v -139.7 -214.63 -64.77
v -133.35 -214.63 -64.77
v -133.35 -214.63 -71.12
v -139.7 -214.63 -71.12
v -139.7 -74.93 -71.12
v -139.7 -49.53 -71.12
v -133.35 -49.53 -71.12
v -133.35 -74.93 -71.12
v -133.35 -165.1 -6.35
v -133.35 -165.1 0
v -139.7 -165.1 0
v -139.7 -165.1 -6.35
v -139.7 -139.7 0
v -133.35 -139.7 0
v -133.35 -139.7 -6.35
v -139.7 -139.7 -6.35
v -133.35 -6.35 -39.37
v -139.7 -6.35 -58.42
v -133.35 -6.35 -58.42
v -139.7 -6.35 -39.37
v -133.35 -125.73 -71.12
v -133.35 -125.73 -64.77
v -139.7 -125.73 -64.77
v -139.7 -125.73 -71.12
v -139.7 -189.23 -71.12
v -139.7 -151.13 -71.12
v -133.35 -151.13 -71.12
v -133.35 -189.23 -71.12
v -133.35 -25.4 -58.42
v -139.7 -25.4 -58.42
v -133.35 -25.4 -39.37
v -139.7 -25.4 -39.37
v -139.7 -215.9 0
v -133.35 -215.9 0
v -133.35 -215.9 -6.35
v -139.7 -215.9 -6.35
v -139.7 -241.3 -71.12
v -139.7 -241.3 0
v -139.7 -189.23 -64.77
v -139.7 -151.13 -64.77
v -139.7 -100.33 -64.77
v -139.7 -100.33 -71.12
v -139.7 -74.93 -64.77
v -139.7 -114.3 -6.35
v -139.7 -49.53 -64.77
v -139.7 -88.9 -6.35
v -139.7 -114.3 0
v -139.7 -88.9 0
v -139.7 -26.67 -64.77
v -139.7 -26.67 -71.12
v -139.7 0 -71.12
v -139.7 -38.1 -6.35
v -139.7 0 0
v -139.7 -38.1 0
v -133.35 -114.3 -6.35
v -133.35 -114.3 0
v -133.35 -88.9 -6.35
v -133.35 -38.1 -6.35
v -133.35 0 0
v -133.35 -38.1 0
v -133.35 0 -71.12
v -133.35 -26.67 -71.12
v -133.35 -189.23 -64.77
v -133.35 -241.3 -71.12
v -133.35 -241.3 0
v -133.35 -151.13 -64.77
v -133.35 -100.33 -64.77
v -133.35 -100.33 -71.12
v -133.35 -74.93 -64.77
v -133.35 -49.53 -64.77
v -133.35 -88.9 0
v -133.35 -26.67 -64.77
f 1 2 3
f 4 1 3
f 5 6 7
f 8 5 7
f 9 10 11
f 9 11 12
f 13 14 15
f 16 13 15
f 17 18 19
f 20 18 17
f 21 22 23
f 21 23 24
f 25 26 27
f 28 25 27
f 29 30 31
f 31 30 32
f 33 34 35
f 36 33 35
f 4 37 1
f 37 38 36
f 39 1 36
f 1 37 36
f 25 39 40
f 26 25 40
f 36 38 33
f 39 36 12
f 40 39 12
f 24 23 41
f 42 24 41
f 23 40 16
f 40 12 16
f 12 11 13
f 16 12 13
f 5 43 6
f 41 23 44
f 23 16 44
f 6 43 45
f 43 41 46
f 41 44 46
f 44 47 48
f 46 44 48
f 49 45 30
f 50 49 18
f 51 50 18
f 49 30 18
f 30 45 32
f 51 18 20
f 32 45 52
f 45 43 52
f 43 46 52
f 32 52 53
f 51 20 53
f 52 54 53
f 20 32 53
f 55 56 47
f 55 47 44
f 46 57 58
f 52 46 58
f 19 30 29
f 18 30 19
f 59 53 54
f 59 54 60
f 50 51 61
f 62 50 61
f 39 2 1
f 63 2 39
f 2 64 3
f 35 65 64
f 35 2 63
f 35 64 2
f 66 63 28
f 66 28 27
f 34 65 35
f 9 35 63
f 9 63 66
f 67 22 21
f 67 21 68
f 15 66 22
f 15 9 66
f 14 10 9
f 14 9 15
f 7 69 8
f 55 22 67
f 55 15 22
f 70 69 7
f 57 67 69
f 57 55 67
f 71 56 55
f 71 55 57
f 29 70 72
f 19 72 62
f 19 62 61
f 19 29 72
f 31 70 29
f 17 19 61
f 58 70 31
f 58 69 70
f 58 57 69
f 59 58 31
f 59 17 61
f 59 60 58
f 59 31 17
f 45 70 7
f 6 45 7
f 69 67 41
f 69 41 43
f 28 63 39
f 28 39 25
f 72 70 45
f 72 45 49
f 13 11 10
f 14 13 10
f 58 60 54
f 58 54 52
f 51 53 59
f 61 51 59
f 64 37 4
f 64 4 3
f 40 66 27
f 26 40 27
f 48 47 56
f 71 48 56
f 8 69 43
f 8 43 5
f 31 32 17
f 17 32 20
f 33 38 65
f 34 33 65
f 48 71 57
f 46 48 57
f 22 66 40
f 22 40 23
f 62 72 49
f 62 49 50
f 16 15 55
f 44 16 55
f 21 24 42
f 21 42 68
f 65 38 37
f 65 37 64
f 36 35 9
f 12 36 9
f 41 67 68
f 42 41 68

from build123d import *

# Parameters (mm, degrees)
SKETCH1_W           = 6.35
SKETCH1_H           = 241.3
BOSS_EXTRUDE1_DEPTH = 71.12
SKETCH2_W           = 6.35
SKETCH2_H           = 22.86
SKETCH2_H_2         = 25.4
CUT_EXTRUDE1_DEPTH  = 6.35
SKETCH3_W           = 6.35
SKETCH3_H           = 50.8
SKETCH3_H_2         = 25.4
CUT_EXTRUDE2_DEPTH  = 6.35
SKETCH4_W           = 19.05
SKETCH4_H           = 19.05
CUT_EXTRUDE3_DEPTH  = 7.35


with BuildPart() as part:
    # Sketch1 → Boss-Extrude1 (new body)
    with BuildSketch(Plane.XY):
        with Locations((-136.525, -120.65)):
            Rectangle(SKETCH1_W, SKETCH1_H)
    extrude(amount=-BOSS_EXTRUDE1_DEPTH)

    # Sketch2 → Cut-Extrude1 (cut)
    with BuildSketch(Plane(origin=(-133.35, 0, 0), x_dir=(0, 0, -1), z_dir=(1, 0, 0))):
        with Locations((67.945, -38.1)):
            Rectangle(SKETCH2_W, SKETCH2_H)
        with Locations((67.945, -87.63)):
            Rectangle(SKETCH2_W, SKETCH2_H_2)
        with Locations((67.945, -138.43)):
            Rectangle(SKETCH2_W, SKETCH2_H_2)
        with Locations((67.945, -201.93)):
            Rectangle(SKETCH2_W, SKETCH2_H_2)
    extrude(amount=-CUT_EXTRUDE1_DEPTH, mode=Mode.SUBTRACT)

    # Sketch3 → Cut-Extrude2 (cut)
    with BuildSketch(Plane(origin=(-133.35, 0, 0), x_dir=(0, 0, -1), z_dir=(1, 0, 0))):
        with Locations((3.175, -190.5)):
            Rectangle(SKETCH3_W, SKETCH3_H)
        with Locations((3.175, -127)):
            Rectangle(SKETCH3_W, SKETCH3_H_2)
        with Locations((3.175, -63.5)):
            Rectangle(SKETCH3_W, SKETCH3_H)
    extrude(amount=-CUT_EXTRUDE2_DEPTH, mode=Mode.SUBTRACT)

    # Sketch4 → Cut-Extrude3 (cut, through all)
    with BuildSketch(Plane.ZY.offset(139.7)):
        with Locations((-48.895, -15.875)):
            Rectangle(SKETCH4_W, SKETCH4_H)
    extrude(amount=-CUT_EXTRUDE3_DEPTH, mode=Mode.SUBTRACT)


solid = part.part
